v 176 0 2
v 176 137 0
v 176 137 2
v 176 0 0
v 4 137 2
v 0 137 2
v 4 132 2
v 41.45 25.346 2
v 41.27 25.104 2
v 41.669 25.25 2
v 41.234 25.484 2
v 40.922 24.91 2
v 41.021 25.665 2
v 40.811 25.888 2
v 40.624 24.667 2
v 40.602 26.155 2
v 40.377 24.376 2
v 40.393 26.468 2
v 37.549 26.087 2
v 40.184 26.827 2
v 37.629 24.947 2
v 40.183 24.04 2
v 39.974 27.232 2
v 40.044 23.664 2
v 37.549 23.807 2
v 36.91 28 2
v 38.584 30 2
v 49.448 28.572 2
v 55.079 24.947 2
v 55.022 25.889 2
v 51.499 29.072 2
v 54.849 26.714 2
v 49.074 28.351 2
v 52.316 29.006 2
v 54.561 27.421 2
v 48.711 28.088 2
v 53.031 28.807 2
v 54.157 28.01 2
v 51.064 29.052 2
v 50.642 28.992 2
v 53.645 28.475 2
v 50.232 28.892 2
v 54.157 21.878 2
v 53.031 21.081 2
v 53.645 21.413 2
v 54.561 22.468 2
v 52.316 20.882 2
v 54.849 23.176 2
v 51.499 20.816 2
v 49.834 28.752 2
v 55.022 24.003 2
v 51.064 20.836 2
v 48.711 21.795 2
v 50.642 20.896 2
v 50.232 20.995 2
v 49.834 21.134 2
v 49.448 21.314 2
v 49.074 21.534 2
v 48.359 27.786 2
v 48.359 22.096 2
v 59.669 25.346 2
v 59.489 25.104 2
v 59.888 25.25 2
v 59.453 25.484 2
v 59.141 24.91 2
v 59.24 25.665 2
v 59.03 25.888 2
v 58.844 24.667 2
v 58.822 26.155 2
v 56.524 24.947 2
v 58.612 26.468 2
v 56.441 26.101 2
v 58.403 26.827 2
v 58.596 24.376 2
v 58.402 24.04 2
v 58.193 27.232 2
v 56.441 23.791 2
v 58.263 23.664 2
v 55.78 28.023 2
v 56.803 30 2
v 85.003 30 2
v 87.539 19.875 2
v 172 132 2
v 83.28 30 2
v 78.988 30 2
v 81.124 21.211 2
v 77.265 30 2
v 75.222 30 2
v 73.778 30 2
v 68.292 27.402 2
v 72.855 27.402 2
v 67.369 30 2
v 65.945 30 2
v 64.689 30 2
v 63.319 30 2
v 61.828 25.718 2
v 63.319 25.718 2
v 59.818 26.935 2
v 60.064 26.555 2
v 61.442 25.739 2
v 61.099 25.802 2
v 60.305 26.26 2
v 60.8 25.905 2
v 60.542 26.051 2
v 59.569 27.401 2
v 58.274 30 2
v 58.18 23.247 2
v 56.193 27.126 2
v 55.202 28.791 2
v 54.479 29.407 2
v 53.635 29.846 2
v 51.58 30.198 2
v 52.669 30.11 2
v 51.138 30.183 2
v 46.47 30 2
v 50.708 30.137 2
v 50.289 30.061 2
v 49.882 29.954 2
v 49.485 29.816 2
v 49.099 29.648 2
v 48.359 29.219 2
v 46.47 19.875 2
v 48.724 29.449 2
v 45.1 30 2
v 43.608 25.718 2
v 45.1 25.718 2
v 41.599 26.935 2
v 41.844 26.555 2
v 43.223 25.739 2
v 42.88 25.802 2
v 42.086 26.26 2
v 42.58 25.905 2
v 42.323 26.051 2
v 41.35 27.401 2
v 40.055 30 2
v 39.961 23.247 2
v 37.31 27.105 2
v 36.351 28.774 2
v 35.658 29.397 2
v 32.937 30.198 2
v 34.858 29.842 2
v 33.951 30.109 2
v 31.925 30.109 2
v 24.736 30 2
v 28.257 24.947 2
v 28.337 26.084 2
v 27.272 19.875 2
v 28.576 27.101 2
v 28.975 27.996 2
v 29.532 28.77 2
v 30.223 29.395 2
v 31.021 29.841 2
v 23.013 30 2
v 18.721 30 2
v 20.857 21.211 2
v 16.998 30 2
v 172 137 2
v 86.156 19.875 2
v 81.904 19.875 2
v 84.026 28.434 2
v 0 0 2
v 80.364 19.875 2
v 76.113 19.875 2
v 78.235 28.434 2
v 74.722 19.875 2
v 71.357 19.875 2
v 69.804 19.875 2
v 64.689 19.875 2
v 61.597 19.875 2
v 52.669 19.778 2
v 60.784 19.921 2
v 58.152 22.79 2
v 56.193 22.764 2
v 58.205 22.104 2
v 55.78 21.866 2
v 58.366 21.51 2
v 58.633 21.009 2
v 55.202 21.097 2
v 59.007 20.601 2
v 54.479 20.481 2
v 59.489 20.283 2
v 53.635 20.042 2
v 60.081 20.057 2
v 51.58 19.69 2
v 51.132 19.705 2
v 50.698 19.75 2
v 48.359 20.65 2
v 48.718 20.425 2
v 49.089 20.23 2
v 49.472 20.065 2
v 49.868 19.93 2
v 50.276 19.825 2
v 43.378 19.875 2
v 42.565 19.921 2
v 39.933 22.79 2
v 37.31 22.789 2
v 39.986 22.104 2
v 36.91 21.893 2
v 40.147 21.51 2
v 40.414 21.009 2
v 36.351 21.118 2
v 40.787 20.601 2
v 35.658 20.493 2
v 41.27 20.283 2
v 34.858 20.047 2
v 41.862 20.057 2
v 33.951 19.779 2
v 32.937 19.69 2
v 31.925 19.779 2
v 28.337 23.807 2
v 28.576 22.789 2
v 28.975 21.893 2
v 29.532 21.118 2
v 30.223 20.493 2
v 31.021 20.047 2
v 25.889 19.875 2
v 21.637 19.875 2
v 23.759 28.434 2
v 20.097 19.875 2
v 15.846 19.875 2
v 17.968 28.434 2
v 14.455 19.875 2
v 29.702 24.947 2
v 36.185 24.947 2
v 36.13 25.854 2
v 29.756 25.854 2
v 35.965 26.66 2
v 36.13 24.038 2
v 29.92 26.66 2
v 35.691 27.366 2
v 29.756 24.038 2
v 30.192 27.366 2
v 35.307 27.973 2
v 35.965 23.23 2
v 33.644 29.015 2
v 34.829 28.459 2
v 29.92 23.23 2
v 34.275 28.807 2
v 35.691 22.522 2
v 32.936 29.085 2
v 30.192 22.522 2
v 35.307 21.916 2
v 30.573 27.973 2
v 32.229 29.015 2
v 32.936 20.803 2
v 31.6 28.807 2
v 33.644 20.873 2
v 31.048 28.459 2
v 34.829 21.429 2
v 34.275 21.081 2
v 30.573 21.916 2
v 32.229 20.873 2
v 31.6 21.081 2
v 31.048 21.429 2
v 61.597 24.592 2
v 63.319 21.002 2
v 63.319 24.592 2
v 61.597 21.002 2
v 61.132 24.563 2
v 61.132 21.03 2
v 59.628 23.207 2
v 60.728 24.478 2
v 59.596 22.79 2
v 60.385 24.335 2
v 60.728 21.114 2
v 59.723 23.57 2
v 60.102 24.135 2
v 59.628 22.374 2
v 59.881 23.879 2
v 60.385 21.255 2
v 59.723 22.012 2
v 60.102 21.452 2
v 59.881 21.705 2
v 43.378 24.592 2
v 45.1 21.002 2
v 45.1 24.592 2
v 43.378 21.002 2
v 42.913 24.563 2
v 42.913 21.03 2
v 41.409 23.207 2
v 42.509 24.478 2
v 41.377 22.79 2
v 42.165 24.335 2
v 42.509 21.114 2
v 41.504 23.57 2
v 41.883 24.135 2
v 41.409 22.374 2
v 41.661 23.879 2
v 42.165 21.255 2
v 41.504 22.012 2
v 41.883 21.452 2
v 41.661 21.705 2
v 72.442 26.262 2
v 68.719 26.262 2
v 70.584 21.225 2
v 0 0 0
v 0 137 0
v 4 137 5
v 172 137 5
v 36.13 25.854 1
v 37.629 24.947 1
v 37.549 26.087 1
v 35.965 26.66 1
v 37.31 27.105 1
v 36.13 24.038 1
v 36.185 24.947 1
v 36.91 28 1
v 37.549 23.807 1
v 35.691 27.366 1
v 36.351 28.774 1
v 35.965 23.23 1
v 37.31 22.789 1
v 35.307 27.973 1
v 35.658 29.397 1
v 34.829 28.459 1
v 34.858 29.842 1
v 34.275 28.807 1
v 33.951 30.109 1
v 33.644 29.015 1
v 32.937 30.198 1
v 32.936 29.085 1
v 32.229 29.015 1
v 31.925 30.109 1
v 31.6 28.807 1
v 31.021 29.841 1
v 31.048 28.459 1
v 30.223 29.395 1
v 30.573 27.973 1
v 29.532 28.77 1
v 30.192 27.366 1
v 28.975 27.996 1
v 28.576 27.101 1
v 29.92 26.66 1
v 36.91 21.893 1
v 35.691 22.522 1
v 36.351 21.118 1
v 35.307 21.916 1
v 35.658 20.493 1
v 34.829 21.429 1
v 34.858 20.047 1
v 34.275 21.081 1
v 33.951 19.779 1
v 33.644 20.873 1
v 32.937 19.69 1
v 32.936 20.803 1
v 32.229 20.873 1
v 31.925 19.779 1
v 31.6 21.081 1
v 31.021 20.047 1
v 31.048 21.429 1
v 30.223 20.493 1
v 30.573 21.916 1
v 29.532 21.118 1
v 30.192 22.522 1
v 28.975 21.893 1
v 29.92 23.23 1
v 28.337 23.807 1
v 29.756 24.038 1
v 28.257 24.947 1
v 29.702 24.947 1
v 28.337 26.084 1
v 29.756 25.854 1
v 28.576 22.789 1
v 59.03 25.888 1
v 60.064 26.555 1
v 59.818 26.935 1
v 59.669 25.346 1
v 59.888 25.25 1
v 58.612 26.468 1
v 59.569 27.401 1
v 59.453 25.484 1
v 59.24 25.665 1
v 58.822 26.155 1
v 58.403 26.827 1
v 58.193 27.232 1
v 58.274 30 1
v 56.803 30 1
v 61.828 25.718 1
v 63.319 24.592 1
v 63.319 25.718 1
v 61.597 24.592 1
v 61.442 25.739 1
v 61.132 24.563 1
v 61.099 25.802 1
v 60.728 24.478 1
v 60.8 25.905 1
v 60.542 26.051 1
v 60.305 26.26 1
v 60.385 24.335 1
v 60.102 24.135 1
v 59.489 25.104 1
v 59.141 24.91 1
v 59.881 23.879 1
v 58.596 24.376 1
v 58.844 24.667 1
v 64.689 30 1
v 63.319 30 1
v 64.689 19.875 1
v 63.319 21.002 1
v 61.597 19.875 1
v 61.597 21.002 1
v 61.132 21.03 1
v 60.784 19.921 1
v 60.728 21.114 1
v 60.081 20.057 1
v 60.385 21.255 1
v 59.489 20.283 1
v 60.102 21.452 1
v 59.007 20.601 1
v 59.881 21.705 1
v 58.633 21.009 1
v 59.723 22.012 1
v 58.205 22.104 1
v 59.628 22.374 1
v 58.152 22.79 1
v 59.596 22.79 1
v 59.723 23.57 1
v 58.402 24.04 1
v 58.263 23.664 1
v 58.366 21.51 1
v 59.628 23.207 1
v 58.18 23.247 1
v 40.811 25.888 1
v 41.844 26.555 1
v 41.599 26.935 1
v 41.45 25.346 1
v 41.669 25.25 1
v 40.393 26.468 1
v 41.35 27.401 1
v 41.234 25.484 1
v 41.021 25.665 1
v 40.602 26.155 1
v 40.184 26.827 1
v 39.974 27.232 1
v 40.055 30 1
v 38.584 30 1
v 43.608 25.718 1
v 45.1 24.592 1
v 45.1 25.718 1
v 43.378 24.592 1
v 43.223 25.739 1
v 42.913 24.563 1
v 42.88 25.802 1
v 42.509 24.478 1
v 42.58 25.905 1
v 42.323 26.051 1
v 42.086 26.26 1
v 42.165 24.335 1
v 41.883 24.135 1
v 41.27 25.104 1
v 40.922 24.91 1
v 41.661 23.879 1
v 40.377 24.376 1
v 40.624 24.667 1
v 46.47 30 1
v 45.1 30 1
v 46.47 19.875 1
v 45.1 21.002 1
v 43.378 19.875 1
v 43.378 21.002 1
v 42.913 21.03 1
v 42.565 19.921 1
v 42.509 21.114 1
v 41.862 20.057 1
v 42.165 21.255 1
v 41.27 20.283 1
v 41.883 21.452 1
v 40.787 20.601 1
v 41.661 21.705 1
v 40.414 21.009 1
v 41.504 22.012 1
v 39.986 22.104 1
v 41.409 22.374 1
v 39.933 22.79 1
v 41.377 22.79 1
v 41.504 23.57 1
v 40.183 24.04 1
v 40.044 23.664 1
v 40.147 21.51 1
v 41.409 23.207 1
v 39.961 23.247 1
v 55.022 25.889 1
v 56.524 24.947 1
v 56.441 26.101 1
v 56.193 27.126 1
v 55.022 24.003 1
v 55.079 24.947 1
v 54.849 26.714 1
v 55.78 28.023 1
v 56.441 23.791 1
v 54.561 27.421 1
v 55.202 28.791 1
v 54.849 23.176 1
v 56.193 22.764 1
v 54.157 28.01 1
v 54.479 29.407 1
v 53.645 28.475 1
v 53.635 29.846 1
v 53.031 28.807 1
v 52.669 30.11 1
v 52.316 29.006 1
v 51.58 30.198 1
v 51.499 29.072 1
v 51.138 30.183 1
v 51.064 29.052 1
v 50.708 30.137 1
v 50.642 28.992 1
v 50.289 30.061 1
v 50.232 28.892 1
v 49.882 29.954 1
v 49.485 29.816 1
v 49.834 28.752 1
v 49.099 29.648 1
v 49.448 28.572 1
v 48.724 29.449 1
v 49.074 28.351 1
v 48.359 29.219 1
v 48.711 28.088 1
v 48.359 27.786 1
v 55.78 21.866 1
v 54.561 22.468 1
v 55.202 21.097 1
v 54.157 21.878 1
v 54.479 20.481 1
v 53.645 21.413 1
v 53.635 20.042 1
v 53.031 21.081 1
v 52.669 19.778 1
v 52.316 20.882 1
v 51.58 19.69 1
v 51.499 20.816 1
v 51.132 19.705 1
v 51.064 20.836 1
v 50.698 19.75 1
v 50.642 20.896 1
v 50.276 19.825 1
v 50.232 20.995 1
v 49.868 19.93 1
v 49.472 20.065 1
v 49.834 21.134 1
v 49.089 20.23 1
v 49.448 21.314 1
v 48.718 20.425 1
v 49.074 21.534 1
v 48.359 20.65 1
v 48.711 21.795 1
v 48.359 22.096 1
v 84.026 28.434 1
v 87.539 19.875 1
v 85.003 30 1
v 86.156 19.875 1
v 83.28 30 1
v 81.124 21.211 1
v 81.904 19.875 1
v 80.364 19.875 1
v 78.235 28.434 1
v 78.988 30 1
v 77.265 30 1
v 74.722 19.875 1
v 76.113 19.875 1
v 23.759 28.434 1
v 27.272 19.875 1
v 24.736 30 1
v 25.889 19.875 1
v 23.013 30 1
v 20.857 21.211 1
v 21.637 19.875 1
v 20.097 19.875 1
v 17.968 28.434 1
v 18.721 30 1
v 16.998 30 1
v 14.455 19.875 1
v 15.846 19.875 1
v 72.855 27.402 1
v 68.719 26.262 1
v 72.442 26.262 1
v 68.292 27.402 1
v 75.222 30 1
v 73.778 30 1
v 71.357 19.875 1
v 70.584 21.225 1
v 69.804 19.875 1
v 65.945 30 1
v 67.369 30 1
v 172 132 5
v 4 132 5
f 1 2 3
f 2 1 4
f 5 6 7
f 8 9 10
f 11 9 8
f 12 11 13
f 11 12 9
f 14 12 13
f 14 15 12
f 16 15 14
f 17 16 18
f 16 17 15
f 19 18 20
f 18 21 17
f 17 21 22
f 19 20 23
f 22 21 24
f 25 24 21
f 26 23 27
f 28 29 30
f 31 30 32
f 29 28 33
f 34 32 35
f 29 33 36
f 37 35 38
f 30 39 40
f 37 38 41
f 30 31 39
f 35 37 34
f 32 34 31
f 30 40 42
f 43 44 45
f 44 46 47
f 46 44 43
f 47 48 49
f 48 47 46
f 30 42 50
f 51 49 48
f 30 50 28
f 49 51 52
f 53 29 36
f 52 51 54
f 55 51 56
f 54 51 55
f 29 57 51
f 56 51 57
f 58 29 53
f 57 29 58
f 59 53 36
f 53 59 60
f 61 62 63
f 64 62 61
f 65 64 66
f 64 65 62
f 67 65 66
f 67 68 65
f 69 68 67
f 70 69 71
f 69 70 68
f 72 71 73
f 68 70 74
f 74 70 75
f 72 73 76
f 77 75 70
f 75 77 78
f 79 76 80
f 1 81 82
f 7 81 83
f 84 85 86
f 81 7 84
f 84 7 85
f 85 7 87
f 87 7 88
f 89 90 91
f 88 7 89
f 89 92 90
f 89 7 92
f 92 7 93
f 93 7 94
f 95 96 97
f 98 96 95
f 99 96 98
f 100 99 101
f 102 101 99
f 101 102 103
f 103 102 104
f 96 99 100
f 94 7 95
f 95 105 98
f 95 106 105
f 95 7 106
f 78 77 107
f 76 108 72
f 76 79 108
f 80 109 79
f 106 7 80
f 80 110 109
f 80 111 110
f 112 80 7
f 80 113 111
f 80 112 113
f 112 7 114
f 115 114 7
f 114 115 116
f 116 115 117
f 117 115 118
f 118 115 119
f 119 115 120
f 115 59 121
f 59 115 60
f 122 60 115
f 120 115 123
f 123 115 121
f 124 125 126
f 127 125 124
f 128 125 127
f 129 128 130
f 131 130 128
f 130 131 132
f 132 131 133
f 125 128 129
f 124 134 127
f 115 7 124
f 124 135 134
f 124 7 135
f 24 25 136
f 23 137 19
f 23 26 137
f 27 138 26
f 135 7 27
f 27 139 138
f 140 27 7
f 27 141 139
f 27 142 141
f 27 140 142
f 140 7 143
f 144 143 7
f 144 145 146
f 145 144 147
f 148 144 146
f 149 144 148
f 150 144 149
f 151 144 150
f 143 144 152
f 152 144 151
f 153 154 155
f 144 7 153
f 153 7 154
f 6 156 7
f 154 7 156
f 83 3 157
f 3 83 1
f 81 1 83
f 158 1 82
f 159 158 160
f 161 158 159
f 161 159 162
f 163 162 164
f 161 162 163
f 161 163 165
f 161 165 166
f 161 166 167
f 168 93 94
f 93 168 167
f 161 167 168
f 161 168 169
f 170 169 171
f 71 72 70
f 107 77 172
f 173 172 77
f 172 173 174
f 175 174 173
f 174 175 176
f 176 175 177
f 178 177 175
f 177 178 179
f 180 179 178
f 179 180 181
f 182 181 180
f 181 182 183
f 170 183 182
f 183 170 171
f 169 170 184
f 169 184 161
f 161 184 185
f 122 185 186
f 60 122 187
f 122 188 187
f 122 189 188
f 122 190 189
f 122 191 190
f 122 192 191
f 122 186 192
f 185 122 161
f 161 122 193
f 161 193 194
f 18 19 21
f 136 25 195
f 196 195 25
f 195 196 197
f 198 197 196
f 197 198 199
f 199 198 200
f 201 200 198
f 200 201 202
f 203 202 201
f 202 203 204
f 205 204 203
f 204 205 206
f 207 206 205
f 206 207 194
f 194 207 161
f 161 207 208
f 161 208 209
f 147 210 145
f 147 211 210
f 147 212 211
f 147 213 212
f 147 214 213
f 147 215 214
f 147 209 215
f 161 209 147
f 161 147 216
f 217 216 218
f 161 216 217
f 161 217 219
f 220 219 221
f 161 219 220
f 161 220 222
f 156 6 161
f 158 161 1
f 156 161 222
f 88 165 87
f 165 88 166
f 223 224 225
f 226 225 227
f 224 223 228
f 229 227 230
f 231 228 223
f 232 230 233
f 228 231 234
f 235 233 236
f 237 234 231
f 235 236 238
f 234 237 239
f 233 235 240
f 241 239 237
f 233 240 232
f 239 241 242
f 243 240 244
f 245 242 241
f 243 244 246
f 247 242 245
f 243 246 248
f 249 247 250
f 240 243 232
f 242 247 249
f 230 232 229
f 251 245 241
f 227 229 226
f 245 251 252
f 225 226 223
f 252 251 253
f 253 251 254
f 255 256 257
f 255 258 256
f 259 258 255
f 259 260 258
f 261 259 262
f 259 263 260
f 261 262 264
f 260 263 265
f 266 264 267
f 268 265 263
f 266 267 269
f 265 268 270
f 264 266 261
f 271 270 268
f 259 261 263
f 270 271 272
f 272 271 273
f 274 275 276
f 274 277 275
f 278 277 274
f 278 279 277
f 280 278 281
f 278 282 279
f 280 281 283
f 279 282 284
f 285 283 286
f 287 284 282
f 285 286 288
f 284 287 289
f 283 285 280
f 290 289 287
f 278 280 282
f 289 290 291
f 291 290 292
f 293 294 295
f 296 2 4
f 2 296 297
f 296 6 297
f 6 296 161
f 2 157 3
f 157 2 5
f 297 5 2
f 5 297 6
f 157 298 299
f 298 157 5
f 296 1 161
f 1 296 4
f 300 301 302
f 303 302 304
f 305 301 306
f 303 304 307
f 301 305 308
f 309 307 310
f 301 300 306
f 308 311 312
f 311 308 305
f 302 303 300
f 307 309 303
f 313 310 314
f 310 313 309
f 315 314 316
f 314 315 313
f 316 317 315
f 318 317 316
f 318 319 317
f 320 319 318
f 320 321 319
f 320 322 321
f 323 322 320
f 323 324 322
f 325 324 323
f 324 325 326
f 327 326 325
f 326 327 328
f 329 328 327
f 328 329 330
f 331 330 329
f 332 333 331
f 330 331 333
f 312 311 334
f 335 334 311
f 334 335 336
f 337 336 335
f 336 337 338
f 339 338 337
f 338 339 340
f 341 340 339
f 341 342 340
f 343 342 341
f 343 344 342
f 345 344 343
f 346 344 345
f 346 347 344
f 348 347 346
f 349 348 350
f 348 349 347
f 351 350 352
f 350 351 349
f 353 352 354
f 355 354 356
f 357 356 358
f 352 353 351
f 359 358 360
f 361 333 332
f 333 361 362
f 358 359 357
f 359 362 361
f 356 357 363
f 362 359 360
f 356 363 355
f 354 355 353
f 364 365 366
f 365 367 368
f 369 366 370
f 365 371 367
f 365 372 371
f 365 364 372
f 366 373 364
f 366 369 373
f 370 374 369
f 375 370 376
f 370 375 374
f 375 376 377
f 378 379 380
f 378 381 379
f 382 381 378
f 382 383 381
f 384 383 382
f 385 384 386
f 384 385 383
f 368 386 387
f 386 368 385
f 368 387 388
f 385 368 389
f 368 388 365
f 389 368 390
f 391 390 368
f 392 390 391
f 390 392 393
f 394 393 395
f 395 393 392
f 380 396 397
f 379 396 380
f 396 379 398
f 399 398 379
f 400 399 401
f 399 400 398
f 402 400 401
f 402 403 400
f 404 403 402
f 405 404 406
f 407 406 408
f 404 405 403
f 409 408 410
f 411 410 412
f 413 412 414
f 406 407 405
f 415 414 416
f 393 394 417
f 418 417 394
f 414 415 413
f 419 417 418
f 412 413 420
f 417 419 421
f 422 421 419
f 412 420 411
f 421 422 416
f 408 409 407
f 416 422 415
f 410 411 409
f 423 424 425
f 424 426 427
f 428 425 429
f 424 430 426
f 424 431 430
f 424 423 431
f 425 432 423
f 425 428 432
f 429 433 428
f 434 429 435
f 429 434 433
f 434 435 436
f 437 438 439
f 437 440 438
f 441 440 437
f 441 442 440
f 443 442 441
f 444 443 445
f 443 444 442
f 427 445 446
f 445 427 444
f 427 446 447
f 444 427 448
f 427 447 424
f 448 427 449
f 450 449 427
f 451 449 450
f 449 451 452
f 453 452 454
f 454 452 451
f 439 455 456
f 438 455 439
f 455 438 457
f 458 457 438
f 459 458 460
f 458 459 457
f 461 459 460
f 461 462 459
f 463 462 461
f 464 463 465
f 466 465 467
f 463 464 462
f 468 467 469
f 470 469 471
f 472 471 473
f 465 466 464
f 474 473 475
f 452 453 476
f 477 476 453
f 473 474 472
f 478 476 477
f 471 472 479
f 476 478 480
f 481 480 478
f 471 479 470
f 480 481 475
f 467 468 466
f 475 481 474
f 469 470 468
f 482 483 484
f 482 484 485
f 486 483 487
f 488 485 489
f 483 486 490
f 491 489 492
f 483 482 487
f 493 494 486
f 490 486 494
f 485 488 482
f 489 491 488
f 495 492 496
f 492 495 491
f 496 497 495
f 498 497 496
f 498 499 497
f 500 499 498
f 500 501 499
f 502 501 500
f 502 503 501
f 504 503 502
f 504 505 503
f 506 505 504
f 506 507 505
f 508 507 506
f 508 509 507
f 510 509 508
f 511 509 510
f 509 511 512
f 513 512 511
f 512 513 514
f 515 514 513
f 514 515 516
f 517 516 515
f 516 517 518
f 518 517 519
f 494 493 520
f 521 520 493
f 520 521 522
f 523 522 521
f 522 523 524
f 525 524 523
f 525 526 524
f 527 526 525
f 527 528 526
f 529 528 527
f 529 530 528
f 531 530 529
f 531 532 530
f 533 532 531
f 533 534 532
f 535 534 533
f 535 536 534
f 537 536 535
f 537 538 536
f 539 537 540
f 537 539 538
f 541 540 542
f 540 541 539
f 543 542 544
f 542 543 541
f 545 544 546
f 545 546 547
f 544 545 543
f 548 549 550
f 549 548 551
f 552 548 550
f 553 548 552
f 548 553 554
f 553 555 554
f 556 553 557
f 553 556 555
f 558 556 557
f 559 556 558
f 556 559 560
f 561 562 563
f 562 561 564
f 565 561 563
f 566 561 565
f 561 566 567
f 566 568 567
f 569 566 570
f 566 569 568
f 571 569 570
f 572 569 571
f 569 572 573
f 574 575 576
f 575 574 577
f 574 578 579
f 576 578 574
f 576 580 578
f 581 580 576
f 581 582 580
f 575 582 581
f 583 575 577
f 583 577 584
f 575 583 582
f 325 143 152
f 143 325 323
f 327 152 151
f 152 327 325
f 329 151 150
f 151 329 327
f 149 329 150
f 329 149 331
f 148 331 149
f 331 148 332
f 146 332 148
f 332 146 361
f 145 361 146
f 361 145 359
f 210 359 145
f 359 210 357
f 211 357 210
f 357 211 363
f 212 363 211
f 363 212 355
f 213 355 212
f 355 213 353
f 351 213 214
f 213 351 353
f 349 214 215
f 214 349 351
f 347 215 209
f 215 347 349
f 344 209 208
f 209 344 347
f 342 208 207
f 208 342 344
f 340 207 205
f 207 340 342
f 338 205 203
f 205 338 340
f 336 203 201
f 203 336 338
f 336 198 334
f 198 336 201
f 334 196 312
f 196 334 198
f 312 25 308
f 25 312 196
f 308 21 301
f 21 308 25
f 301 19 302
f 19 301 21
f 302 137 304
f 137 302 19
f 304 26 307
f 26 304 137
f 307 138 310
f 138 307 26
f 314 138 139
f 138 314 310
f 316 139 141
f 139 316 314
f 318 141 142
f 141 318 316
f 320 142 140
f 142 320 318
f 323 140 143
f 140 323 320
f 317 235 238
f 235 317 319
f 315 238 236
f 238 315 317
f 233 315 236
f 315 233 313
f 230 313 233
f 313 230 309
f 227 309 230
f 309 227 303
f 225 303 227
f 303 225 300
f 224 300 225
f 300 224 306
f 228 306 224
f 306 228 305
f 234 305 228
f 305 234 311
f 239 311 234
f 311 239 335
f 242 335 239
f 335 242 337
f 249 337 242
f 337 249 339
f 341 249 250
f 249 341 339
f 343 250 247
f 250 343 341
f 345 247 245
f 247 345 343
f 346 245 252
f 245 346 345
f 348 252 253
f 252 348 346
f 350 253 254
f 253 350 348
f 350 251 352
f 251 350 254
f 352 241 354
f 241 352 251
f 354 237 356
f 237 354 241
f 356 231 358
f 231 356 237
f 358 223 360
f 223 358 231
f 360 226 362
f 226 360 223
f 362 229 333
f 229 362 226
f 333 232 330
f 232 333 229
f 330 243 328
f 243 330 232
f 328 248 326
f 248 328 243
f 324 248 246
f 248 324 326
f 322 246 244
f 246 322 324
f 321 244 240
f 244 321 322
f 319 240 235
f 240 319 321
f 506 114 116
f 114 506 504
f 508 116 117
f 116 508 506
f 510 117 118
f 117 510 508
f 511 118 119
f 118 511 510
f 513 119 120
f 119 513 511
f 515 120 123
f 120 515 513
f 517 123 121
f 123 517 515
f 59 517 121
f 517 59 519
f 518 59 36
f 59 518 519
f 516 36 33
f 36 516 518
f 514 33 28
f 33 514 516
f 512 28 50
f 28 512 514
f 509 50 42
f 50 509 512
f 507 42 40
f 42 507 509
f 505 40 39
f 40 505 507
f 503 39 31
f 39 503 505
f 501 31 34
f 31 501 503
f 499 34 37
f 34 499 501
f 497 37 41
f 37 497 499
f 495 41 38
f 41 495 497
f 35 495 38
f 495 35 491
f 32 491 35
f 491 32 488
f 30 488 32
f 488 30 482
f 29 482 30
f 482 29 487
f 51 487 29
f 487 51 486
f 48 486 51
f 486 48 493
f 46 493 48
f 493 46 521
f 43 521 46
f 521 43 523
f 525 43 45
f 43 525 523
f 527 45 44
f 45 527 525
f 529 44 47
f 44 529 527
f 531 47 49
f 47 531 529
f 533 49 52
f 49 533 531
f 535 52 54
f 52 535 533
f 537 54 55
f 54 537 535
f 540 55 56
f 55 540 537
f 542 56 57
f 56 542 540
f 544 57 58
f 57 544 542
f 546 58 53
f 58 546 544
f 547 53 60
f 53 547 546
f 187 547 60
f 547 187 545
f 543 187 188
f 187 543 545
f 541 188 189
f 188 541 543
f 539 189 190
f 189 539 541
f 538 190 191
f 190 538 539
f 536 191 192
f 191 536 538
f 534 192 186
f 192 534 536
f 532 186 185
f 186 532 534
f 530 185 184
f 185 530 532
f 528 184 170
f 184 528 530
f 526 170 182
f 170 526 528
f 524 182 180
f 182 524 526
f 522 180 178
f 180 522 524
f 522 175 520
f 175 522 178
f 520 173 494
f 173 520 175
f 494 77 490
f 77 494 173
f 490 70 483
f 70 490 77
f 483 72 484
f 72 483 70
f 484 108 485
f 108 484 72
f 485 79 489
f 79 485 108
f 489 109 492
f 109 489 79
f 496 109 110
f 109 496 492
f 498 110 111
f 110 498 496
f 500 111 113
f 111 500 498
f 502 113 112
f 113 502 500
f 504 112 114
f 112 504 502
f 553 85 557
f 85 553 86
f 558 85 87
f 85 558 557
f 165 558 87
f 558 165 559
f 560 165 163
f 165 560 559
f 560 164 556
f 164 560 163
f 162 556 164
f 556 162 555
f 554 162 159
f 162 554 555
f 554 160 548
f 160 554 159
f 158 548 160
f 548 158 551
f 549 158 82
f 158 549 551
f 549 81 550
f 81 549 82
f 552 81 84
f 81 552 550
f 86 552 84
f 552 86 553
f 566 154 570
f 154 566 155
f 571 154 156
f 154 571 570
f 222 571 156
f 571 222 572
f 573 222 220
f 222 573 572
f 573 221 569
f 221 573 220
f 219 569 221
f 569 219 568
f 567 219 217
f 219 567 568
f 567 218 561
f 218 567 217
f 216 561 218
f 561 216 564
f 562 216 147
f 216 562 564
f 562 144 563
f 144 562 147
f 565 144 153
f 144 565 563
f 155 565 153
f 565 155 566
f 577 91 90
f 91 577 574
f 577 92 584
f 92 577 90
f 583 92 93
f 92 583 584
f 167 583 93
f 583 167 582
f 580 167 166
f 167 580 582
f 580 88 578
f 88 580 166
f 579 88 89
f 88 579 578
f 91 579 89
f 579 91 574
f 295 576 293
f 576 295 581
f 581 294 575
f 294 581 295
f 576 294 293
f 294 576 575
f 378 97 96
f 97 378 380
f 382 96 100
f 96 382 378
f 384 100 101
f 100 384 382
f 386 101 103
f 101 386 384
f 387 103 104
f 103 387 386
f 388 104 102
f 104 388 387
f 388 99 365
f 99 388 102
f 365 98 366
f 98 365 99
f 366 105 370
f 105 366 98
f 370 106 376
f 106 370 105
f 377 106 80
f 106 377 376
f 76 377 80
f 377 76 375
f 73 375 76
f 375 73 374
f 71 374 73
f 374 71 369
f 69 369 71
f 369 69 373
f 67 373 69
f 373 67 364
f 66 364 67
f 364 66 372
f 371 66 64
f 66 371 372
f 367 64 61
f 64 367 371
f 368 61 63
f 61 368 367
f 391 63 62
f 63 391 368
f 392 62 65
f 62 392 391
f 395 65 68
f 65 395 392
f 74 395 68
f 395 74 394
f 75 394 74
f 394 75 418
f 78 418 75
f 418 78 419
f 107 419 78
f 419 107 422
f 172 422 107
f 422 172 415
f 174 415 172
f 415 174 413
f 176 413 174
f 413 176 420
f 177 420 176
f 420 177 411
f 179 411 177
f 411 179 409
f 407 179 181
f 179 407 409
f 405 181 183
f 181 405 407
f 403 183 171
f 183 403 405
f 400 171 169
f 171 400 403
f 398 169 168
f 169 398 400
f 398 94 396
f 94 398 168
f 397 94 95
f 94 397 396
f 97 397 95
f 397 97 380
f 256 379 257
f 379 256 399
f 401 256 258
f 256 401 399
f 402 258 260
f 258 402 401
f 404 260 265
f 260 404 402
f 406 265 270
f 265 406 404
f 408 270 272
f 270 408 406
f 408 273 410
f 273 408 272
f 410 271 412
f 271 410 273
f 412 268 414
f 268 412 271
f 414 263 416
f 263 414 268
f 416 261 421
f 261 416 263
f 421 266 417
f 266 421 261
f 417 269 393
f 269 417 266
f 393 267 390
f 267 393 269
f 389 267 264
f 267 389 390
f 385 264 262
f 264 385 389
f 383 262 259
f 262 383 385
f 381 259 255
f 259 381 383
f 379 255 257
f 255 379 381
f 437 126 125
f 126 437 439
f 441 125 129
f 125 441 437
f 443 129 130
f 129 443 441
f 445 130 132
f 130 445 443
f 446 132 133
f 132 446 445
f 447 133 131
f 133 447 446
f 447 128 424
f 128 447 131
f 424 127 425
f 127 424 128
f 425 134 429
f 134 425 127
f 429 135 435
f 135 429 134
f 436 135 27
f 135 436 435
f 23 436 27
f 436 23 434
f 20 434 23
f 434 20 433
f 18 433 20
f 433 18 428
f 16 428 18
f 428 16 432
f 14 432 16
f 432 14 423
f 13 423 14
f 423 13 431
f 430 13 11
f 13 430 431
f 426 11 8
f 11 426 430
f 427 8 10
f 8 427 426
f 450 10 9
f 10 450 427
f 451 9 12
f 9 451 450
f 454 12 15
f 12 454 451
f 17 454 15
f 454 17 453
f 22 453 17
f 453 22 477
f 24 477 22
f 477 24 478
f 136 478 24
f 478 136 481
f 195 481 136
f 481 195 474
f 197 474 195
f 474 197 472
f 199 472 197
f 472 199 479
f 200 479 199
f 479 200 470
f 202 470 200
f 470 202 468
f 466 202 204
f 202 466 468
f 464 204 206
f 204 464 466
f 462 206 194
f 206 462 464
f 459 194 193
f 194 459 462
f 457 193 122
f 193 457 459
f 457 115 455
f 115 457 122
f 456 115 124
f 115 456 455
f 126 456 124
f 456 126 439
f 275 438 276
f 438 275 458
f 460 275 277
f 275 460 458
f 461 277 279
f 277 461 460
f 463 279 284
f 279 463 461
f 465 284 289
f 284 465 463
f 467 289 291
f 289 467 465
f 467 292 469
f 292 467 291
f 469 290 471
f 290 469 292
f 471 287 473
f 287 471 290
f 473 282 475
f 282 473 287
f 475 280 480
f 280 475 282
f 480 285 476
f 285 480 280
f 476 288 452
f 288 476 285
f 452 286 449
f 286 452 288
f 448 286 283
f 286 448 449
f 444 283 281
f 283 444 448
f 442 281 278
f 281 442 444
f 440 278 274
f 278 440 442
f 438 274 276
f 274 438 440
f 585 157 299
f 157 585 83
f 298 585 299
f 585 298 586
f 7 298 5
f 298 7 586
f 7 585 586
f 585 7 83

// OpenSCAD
//$fn=360;
//67x93x22
//cards = 85x125x10
x=176;
y=137;
z=2;
difference() {
  translate([0,0,0])
  cube([x,y,z]);
  translate ([x/2,30,1])
  linear_extrude(1)
  rotate([0,0,180])
  text ("WARCROW",font="Helvetica LT MM");
}
//handle
translate([4,y-5,z])
cube([x-8,5,z+1]);
